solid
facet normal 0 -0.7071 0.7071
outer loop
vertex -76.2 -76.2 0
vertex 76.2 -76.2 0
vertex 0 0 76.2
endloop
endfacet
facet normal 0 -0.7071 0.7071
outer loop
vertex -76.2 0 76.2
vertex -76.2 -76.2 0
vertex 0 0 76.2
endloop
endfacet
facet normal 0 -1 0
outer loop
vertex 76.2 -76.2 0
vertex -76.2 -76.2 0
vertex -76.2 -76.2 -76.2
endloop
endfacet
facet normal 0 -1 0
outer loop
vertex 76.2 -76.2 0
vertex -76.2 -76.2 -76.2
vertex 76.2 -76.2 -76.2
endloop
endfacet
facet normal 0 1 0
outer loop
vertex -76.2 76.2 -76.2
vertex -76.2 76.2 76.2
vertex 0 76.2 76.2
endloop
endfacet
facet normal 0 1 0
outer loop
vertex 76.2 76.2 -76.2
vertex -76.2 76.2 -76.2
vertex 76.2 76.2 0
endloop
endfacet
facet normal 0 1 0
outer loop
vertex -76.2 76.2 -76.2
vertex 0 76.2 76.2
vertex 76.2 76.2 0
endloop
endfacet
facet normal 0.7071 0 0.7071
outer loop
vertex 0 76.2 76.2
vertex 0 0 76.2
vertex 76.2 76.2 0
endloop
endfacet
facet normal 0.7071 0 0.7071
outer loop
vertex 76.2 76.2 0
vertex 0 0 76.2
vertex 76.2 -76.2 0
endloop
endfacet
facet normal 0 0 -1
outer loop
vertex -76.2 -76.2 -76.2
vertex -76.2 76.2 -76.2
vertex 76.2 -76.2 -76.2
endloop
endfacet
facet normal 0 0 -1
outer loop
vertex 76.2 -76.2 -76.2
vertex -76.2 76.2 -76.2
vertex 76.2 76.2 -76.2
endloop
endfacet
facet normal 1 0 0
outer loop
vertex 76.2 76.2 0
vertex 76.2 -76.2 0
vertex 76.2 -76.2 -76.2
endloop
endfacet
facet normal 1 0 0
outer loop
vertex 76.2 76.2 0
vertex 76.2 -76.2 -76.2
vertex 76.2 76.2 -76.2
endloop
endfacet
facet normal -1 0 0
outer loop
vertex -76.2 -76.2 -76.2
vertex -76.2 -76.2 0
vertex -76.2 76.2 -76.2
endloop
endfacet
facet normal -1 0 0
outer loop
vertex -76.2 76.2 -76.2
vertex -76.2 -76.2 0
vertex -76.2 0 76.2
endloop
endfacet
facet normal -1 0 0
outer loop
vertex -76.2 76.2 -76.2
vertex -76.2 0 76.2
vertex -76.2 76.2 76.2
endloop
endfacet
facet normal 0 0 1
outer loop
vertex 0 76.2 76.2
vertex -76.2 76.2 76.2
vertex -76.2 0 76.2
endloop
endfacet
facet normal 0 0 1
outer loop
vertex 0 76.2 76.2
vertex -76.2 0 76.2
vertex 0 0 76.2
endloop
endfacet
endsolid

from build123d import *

# Parameters (mm, degrees)
F0_W     = 152.4
F0_H     = 152.4
F1_DEPTH = 76.2
F4_DEPTH = 152.401
F5_DEPTH = 152.401


with BuildPart() as f1:
    # F0 (on Top) → F1 (new body, symmetric)
    with BuildSketch(Plane.XY):
        Rectangle(F0_W, F0_H)
    extrude(amount=F1_DEPTH, both=True)

    # F2 (on face) → F4 (cut, through all)
    with BuildSketch(Plane.YZ.offset(76.2)):
        Polygon((-76.2, 76.2), (-76.2, 0), (0, 76.2), align=None)
    extrude(amount=-F4_DEPTH, mode=Mode.SUBTRACT)

    # F3 (on face) → F5 (cut, through all)
    with BuildSketch(Plane.XZ.offset(76.2)):
        Polygon((76.2, 76.2), (0, 76.2), (76.2, 0), align=None)
    extrude(amount=-F5_DEPTH, mode=Mode.SUBTRACT)


solid = f1.part
